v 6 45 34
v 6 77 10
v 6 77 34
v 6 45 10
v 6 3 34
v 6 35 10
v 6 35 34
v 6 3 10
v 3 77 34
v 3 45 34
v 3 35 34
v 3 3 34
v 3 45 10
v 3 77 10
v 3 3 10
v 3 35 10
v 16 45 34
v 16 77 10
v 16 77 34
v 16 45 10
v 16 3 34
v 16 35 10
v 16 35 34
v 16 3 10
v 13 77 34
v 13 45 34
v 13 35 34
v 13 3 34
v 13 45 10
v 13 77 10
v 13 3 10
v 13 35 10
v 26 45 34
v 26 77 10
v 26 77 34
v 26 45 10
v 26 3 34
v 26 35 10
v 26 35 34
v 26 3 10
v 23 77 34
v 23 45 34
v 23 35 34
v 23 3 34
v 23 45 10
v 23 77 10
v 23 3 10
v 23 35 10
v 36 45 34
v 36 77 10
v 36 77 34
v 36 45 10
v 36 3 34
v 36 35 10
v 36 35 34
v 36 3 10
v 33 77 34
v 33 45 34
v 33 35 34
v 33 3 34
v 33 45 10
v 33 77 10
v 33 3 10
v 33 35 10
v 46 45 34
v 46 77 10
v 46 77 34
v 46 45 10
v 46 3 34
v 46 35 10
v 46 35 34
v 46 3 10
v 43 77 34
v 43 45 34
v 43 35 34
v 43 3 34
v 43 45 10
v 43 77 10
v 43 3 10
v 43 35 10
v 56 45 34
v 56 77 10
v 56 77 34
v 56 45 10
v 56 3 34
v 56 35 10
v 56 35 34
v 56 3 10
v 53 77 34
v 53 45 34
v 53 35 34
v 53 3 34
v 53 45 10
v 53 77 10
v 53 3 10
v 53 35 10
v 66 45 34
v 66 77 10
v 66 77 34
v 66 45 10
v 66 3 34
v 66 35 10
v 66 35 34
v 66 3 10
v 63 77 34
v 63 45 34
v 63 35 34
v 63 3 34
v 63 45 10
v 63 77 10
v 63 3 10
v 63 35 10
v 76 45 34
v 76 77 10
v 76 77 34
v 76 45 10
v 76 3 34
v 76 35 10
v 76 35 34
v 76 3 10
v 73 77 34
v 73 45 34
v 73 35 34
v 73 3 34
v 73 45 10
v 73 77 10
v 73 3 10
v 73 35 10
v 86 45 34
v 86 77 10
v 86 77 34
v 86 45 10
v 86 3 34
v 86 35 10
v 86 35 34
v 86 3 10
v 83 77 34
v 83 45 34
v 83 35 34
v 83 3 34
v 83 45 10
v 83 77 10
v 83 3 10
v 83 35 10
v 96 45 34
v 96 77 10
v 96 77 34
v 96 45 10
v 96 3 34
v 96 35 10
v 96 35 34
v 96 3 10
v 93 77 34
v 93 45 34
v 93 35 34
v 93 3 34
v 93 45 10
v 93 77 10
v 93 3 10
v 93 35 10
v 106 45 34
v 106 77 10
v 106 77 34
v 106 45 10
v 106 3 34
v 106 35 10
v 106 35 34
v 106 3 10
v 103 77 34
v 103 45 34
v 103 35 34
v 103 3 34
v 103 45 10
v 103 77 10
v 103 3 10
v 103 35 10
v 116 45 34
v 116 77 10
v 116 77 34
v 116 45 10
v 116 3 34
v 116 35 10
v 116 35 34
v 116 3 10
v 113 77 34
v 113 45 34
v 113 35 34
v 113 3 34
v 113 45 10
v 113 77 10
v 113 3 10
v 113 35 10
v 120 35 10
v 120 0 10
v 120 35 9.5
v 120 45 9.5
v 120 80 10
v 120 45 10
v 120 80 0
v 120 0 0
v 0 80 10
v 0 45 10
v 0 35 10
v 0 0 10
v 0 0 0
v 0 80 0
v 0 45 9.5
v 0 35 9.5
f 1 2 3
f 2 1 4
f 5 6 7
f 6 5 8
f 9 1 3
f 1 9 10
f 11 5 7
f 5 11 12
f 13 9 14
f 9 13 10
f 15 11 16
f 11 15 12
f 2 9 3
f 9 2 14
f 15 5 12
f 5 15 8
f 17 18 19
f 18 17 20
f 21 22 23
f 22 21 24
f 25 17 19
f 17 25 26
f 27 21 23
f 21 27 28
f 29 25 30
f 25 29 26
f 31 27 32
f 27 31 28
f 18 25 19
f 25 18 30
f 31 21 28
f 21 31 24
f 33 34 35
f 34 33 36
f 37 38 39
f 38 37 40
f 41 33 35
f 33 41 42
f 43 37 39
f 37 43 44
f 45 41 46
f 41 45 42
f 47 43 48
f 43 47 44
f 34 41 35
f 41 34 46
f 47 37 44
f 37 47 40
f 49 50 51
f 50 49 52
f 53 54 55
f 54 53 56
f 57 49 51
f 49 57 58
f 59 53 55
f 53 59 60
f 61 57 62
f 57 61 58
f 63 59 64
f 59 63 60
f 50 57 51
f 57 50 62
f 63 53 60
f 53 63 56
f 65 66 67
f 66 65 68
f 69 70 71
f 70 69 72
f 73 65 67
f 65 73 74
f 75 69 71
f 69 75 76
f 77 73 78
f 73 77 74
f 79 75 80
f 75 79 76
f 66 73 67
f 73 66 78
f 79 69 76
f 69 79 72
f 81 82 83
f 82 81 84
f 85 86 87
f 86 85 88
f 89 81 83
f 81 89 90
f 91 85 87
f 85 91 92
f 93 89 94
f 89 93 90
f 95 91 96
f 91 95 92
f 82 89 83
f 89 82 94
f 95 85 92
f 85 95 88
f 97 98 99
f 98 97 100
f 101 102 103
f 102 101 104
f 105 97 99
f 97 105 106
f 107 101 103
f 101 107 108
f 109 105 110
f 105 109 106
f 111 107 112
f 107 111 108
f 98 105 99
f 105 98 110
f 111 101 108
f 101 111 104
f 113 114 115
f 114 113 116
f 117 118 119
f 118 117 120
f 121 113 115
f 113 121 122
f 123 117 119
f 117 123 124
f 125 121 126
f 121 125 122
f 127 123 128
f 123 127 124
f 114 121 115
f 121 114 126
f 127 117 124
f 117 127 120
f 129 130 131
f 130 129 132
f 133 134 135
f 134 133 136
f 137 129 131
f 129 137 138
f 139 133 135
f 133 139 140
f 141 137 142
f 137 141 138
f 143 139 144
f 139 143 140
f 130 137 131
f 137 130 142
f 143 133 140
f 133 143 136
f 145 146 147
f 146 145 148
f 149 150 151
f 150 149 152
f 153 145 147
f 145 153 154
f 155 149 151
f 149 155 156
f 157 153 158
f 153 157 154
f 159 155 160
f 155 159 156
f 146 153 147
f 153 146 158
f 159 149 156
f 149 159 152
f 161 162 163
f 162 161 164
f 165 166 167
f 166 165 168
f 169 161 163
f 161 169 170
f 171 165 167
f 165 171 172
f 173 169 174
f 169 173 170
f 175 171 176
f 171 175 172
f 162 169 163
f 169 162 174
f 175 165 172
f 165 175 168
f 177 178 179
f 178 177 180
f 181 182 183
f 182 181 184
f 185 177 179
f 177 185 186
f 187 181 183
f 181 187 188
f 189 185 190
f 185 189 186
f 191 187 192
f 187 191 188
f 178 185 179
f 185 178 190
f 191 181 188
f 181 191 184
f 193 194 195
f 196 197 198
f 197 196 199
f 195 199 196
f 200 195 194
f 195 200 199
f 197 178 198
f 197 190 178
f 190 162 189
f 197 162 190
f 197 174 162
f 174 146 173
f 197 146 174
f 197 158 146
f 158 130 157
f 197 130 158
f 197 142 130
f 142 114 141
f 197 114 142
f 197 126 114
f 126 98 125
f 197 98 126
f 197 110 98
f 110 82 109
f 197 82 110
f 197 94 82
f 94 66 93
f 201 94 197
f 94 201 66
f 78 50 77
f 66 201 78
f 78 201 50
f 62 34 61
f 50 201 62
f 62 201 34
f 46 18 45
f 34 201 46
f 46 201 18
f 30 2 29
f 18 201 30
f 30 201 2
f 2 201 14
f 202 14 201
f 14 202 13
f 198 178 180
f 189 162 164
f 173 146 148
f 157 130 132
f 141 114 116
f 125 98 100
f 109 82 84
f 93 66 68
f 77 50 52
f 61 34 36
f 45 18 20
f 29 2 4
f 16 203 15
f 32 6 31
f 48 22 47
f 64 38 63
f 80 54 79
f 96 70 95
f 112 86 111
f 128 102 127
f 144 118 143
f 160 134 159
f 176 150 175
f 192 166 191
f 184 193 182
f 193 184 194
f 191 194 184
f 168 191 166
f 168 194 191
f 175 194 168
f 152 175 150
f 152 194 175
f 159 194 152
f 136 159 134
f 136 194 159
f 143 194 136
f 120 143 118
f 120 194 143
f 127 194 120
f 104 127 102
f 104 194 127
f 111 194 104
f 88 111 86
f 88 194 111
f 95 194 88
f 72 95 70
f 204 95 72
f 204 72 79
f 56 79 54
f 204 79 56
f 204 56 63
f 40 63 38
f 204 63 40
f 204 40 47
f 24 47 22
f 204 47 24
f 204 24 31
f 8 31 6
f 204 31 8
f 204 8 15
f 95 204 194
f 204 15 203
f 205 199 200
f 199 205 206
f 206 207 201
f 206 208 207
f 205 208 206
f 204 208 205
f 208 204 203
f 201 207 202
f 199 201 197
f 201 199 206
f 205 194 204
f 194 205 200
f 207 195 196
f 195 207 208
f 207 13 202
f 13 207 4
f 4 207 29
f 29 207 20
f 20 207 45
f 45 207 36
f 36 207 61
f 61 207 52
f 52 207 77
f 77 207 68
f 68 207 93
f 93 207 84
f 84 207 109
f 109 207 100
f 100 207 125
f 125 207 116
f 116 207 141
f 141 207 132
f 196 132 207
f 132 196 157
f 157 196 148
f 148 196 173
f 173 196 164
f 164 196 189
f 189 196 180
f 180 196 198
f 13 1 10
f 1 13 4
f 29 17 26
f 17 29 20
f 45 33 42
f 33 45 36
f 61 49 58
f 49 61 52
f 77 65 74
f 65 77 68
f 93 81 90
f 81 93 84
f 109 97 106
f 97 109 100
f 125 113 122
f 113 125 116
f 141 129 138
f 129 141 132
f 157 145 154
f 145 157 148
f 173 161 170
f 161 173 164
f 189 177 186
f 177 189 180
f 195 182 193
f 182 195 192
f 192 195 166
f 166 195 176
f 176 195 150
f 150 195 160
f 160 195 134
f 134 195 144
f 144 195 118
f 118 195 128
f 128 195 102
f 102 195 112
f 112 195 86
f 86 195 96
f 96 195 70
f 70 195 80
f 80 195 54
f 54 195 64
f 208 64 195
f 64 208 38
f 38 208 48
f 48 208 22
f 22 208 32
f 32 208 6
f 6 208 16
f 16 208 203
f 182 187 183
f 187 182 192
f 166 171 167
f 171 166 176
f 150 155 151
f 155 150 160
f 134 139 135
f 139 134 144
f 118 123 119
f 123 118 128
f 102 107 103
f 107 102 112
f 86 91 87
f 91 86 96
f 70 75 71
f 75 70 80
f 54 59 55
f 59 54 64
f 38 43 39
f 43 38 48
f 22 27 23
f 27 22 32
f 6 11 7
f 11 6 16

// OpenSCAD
$fn = 32;

// ----------------------------------------------------------------------
// Heatsink: slotted fin block
// ----------------------------------------------------------------------

// --- parameters (mm) ---
base_l = 120;             // base length, X
base_w = 80;              // base width, Y
base_t = 10;              // base plate thickness
fin_h = 25;               // fin height above the base
fin_t = 3;                // fin thickness
edge = 3;                 // margin from the base ends
pitch = 10;               // fin pitch
slot_w = 10;              // central slot width, Y

n_fins = floor((base_l - 2 * edge - fin_t) / pitch) + 1;  // fin count
total_h = base_t + fin_h - 1;  // overall height

difference() {
union() {
  cube([base_l, base_w, base_t]);
  for (i = [0 : n_fins - 1])
    translate([edge + i * pitch, edge, base_t - 1])
      cube([fin_t, base_w - 2 * edge, fin_h]);
}
  translate([-1, base_w / 2 - slot_w / 2, base_t - 0.5])
    cube([base_l + 2, slot_w, fin_h + 2]);
}
